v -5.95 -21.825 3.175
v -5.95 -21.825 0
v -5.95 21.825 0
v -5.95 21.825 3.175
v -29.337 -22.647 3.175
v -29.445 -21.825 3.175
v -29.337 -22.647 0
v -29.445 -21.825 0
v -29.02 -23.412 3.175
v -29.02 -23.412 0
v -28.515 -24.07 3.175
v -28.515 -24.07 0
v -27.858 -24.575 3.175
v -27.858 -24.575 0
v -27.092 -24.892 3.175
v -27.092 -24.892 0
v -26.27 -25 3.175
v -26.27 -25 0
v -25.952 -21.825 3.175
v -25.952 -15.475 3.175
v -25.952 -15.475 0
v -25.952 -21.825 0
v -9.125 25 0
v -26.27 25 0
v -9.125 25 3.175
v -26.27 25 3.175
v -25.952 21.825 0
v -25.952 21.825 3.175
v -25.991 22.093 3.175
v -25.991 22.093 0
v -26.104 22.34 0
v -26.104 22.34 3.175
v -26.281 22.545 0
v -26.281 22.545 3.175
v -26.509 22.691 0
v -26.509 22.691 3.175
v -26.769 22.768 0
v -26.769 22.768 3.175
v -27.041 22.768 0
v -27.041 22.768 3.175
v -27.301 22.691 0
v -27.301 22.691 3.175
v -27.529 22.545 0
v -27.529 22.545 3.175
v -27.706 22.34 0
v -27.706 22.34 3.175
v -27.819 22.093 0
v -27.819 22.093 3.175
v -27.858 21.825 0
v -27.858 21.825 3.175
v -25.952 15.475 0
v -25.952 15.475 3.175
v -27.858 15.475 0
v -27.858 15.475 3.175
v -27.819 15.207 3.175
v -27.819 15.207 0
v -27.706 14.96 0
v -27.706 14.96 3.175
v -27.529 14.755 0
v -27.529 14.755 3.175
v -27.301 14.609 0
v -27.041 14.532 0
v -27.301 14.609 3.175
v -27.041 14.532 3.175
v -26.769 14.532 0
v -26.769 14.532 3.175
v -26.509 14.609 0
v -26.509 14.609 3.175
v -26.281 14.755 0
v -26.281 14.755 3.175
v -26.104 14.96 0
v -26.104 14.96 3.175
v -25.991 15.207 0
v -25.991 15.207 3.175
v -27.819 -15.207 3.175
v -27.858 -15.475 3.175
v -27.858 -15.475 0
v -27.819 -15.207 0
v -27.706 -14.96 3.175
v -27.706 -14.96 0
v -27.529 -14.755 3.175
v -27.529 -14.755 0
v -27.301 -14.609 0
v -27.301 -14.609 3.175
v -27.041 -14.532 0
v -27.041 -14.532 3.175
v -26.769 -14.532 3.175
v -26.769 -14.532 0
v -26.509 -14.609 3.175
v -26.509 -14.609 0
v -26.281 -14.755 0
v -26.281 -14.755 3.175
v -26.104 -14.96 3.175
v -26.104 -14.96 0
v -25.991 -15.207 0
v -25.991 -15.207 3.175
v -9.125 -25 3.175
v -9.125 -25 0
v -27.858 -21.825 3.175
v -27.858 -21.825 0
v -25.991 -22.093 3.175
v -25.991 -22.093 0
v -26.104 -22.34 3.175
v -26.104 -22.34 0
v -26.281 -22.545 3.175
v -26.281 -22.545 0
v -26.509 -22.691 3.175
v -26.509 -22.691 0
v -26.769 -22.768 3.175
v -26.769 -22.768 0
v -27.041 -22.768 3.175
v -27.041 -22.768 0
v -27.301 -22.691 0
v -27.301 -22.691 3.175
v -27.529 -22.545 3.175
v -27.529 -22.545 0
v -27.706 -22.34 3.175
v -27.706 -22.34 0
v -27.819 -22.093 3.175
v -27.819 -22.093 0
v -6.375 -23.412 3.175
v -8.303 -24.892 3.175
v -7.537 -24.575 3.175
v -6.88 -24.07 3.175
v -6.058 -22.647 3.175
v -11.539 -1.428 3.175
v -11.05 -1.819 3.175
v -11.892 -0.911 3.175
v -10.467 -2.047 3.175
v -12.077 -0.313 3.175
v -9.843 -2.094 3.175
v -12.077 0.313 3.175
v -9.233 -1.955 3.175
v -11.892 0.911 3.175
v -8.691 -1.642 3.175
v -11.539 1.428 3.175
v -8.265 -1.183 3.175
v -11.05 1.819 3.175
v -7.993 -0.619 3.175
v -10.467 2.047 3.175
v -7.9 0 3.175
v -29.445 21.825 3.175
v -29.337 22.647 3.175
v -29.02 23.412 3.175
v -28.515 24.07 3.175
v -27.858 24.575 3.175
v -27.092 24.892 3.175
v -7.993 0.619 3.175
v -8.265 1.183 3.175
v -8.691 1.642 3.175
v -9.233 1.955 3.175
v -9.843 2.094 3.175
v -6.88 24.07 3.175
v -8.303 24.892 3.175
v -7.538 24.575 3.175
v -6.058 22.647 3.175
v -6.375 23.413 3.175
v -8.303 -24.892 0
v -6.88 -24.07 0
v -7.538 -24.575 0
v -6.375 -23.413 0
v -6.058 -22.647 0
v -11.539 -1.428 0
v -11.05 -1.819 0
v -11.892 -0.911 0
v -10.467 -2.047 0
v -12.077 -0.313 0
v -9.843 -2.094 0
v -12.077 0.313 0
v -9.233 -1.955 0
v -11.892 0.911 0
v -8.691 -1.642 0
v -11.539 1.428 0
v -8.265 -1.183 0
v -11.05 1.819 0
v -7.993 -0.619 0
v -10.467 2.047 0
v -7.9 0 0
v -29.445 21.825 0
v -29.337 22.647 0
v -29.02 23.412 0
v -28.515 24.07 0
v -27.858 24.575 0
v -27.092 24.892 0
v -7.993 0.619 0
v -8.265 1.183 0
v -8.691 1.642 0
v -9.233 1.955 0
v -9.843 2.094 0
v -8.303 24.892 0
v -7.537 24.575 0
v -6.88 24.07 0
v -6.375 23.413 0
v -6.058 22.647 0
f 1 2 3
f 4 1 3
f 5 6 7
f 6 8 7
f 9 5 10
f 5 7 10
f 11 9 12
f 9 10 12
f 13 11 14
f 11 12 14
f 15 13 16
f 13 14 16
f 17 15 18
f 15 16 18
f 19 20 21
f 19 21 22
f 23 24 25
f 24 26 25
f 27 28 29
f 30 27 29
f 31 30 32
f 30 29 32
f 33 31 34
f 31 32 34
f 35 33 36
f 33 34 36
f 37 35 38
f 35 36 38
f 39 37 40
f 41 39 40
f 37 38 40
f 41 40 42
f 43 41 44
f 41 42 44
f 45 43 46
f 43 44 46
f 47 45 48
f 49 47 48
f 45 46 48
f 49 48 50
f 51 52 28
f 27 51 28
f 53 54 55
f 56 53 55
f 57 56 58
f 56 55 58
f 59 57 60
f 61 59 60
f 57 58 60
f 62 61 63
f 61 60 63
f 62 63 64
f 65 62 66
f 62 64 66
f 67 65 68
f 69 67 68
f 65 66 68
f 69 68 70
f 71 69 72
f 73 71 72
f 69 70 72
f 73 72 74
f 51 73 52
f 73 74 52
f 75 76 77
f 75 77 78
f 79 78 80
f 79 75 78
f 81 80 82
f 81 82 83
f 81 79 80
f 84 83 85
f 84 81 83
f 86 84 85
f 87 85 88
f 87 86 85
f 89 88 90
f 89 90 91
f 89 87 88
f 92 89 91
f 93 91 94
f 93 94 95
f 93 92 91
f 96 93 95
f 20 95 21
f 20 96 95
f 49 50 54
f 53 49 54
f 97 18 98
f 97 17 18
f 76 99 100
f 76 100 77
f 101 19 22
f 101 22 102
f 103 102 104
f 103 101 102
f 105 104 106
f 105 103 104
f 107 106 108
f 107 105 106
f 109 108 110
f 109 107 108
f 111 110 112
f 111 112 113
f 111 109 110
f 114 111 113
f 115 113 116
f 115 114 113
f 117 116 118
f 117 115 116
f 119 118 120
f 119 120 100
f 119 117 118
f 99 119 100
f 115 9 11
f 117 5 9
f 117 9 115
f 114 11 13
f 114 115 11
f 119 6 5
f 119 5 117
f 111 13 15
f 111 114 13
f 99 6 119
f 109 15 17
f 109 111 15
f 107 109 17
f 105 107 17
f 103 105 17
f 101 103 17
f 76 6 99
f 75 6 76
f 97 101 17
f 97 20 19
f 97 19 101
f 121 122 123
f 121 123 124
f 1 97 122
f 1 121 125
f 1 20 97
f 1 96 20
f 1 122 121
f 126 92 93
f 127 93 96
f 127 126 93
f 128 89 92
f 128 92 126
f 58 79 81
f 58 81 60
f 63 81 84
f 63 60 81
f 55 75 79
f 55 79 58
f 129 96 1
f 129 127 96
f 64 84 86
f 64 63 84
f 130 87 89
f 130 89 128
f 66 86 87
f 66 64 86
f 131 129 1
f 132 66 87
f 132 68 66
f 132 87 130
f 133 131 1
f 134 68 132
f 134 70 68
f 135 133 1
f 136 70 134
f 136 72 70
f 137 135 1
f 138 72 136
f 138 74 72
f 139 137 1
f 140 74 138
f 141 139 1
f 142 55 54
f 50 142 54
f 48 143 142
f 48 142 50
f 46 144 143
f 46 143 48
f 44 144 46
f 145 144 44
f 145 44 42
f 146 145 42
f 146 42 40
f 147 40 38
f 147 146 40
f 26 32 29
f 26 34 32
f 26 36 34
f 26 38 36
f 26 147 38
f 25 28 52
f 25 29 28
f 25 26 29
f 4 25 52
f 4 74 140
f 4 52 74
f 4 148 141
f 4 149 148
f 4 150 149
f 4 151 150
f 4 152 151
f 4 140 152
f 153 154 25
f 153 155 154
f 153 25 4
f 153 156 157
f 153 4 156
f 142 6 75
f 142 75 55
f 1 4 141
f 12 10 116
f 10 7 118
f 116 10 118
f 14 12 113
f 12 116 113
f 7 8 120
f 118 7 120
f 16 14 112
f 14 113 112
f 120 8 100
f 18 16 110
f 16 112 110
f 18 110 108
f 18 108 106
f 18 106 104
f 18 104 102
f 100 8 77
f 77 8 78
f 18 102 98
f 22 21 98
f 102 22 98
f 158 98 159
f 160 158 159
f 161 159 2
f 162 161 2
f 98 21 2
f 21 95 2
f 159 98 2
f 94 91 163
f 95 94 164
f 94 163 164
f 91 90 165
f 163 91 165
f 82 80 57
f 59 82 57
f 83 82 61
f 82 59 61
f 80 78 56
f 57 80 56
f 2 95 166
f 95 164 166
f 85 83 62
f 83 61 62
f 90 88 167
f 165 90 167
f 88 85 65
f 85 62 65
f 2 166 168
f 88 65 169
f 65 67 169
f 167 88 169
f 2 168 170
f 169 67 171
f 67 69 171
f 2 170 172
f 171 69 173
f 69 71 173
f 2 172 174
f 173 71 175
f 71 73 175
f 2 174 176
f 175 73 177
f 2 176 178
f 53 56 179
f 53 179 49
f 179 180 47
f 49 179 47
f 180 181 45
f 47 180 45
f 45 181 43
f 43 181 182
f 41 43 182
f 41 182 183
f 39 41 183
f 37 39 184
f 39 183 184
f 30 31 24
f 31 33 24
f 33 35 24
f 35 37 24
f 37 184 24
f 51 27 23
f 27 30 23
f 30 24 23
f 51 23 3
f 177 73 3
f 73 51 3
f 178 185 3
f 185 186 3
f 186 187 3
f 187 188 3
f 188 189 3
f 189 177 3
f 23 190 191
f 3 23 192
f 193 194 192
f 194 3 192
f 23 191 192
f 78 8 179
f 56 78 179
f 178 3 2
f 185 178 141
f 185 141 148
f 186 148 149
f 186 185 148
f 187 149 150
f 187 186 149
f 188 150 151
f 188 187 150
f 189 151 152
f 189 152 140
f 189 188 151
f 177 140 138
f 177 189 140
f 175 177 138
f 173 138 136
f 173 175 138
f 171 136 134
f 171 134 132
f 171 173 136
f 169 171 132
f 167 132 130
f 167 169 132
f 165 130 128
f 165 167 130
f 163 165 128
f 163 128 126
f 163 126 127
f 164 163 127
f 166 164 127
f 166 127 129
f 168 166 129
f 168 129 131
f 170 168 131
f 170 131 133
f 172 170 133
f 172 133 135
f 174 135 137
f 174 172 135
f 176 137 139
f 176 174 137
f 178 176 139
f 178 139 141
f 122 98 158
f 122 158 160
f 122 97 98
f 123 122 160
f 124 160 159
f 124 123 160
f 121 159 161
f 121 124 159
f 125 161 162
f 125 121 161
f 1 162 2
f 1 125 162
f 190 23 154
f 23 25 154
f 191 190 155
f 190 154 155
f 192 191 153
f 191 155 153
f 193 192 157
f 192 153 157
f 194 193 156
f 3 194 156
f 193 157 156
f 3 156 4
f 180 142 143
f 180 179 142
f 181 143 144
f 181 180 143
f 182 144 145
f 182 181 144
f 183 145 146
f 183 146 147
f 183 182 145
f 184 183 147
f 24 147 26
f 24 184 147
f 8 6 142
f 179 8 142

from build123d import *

# Parameters (mm, degrees)
SKETCH1_W           = 19.05
SKETCH1_H           = 50
SKETCH1_R           = 2.1
BOSS_EXTRUDE1_DEPTH = 3.175
SKETCH2_W           = 4.445
SKETCH2_H           = 50
BOSS_EXTRUDE2_DEPTH = 3.175
CUT_EXTRUDE1_DEPTH  = 3.175
FILLET1_R           = 3.175


with BuildPart() as part:
    # Sketch1 → Boss-Extrude1 (new body)
    with BuildSketch(Plane.XY):
        with Locations((-15.475, 0)):
            Rectangle(SKETCH1_W, SKETCH1_H)
        with Locations((-10, 0)):
            Circle(SKETCH1_R, mode=Mode.SUBTRACT)
    extrude(amount=BOSS_EXTRUDE1_DEPTH)

    # Sketch2 → Boss-Extrude2 (add)
    with BuildSketch(Plane.XY.offset(3.175)):
        with Locations((-27.2225, 0)):
            Rectangle(SKETCH2_W, SKETCH2_H)
    extrude(amount=-BOSS_EXTRUDE2_DEPTH)

    # Sketch3 → Cut-Extrude1 (cut)
    with BuildSketch(Plane.XY.offset(3.175)):
        with BuildLine():
            Line((-25.9525, -15.475), (-25.9525, -21.825))
            ThreePointArc((-25.9525, -21.825), (-26.905, -22.7775), (-27.8575, -21.825))
            Line((-27.8575, -21.825), (-27.8575, -15.475))
            ThreePointArc((-27.8575, -15.475), (-26.905, -14.5225), (-25.9525, -15.475))
        make_face()
        with BuildLine():
            Line((-25.9525, 15.475), (-25.9525, 21.825))
            ThreePointArc((-25.9525, 21.825), (-26.905, 22.7775), (-27.8575, 21.825))
            Line((-27.8575, 21.825), (-27.8575, 15.475))
            ThreePointArc((-27.8575, 15.475), (-26.905, 14.5225), (-25.9525, 15.475))
        make_face()
    extrude(amount=-CUT_EXTRUDE1_DEPTH, mode=Mode.SUBTRACT)

    # Fillet1
    fillet1_edges = [part.edges().sort_by_distance(p)[0] for p in [
        (-29.445, -25, 1.5875),
        (-29.445, 25, 1.5875),
        (-5.95, 25, 1.5875),
        (-5.95, -25, 1.5875),
    ]]
    fillet(fillet1_edges, radius=FILLET1_R)


solid = part.part
